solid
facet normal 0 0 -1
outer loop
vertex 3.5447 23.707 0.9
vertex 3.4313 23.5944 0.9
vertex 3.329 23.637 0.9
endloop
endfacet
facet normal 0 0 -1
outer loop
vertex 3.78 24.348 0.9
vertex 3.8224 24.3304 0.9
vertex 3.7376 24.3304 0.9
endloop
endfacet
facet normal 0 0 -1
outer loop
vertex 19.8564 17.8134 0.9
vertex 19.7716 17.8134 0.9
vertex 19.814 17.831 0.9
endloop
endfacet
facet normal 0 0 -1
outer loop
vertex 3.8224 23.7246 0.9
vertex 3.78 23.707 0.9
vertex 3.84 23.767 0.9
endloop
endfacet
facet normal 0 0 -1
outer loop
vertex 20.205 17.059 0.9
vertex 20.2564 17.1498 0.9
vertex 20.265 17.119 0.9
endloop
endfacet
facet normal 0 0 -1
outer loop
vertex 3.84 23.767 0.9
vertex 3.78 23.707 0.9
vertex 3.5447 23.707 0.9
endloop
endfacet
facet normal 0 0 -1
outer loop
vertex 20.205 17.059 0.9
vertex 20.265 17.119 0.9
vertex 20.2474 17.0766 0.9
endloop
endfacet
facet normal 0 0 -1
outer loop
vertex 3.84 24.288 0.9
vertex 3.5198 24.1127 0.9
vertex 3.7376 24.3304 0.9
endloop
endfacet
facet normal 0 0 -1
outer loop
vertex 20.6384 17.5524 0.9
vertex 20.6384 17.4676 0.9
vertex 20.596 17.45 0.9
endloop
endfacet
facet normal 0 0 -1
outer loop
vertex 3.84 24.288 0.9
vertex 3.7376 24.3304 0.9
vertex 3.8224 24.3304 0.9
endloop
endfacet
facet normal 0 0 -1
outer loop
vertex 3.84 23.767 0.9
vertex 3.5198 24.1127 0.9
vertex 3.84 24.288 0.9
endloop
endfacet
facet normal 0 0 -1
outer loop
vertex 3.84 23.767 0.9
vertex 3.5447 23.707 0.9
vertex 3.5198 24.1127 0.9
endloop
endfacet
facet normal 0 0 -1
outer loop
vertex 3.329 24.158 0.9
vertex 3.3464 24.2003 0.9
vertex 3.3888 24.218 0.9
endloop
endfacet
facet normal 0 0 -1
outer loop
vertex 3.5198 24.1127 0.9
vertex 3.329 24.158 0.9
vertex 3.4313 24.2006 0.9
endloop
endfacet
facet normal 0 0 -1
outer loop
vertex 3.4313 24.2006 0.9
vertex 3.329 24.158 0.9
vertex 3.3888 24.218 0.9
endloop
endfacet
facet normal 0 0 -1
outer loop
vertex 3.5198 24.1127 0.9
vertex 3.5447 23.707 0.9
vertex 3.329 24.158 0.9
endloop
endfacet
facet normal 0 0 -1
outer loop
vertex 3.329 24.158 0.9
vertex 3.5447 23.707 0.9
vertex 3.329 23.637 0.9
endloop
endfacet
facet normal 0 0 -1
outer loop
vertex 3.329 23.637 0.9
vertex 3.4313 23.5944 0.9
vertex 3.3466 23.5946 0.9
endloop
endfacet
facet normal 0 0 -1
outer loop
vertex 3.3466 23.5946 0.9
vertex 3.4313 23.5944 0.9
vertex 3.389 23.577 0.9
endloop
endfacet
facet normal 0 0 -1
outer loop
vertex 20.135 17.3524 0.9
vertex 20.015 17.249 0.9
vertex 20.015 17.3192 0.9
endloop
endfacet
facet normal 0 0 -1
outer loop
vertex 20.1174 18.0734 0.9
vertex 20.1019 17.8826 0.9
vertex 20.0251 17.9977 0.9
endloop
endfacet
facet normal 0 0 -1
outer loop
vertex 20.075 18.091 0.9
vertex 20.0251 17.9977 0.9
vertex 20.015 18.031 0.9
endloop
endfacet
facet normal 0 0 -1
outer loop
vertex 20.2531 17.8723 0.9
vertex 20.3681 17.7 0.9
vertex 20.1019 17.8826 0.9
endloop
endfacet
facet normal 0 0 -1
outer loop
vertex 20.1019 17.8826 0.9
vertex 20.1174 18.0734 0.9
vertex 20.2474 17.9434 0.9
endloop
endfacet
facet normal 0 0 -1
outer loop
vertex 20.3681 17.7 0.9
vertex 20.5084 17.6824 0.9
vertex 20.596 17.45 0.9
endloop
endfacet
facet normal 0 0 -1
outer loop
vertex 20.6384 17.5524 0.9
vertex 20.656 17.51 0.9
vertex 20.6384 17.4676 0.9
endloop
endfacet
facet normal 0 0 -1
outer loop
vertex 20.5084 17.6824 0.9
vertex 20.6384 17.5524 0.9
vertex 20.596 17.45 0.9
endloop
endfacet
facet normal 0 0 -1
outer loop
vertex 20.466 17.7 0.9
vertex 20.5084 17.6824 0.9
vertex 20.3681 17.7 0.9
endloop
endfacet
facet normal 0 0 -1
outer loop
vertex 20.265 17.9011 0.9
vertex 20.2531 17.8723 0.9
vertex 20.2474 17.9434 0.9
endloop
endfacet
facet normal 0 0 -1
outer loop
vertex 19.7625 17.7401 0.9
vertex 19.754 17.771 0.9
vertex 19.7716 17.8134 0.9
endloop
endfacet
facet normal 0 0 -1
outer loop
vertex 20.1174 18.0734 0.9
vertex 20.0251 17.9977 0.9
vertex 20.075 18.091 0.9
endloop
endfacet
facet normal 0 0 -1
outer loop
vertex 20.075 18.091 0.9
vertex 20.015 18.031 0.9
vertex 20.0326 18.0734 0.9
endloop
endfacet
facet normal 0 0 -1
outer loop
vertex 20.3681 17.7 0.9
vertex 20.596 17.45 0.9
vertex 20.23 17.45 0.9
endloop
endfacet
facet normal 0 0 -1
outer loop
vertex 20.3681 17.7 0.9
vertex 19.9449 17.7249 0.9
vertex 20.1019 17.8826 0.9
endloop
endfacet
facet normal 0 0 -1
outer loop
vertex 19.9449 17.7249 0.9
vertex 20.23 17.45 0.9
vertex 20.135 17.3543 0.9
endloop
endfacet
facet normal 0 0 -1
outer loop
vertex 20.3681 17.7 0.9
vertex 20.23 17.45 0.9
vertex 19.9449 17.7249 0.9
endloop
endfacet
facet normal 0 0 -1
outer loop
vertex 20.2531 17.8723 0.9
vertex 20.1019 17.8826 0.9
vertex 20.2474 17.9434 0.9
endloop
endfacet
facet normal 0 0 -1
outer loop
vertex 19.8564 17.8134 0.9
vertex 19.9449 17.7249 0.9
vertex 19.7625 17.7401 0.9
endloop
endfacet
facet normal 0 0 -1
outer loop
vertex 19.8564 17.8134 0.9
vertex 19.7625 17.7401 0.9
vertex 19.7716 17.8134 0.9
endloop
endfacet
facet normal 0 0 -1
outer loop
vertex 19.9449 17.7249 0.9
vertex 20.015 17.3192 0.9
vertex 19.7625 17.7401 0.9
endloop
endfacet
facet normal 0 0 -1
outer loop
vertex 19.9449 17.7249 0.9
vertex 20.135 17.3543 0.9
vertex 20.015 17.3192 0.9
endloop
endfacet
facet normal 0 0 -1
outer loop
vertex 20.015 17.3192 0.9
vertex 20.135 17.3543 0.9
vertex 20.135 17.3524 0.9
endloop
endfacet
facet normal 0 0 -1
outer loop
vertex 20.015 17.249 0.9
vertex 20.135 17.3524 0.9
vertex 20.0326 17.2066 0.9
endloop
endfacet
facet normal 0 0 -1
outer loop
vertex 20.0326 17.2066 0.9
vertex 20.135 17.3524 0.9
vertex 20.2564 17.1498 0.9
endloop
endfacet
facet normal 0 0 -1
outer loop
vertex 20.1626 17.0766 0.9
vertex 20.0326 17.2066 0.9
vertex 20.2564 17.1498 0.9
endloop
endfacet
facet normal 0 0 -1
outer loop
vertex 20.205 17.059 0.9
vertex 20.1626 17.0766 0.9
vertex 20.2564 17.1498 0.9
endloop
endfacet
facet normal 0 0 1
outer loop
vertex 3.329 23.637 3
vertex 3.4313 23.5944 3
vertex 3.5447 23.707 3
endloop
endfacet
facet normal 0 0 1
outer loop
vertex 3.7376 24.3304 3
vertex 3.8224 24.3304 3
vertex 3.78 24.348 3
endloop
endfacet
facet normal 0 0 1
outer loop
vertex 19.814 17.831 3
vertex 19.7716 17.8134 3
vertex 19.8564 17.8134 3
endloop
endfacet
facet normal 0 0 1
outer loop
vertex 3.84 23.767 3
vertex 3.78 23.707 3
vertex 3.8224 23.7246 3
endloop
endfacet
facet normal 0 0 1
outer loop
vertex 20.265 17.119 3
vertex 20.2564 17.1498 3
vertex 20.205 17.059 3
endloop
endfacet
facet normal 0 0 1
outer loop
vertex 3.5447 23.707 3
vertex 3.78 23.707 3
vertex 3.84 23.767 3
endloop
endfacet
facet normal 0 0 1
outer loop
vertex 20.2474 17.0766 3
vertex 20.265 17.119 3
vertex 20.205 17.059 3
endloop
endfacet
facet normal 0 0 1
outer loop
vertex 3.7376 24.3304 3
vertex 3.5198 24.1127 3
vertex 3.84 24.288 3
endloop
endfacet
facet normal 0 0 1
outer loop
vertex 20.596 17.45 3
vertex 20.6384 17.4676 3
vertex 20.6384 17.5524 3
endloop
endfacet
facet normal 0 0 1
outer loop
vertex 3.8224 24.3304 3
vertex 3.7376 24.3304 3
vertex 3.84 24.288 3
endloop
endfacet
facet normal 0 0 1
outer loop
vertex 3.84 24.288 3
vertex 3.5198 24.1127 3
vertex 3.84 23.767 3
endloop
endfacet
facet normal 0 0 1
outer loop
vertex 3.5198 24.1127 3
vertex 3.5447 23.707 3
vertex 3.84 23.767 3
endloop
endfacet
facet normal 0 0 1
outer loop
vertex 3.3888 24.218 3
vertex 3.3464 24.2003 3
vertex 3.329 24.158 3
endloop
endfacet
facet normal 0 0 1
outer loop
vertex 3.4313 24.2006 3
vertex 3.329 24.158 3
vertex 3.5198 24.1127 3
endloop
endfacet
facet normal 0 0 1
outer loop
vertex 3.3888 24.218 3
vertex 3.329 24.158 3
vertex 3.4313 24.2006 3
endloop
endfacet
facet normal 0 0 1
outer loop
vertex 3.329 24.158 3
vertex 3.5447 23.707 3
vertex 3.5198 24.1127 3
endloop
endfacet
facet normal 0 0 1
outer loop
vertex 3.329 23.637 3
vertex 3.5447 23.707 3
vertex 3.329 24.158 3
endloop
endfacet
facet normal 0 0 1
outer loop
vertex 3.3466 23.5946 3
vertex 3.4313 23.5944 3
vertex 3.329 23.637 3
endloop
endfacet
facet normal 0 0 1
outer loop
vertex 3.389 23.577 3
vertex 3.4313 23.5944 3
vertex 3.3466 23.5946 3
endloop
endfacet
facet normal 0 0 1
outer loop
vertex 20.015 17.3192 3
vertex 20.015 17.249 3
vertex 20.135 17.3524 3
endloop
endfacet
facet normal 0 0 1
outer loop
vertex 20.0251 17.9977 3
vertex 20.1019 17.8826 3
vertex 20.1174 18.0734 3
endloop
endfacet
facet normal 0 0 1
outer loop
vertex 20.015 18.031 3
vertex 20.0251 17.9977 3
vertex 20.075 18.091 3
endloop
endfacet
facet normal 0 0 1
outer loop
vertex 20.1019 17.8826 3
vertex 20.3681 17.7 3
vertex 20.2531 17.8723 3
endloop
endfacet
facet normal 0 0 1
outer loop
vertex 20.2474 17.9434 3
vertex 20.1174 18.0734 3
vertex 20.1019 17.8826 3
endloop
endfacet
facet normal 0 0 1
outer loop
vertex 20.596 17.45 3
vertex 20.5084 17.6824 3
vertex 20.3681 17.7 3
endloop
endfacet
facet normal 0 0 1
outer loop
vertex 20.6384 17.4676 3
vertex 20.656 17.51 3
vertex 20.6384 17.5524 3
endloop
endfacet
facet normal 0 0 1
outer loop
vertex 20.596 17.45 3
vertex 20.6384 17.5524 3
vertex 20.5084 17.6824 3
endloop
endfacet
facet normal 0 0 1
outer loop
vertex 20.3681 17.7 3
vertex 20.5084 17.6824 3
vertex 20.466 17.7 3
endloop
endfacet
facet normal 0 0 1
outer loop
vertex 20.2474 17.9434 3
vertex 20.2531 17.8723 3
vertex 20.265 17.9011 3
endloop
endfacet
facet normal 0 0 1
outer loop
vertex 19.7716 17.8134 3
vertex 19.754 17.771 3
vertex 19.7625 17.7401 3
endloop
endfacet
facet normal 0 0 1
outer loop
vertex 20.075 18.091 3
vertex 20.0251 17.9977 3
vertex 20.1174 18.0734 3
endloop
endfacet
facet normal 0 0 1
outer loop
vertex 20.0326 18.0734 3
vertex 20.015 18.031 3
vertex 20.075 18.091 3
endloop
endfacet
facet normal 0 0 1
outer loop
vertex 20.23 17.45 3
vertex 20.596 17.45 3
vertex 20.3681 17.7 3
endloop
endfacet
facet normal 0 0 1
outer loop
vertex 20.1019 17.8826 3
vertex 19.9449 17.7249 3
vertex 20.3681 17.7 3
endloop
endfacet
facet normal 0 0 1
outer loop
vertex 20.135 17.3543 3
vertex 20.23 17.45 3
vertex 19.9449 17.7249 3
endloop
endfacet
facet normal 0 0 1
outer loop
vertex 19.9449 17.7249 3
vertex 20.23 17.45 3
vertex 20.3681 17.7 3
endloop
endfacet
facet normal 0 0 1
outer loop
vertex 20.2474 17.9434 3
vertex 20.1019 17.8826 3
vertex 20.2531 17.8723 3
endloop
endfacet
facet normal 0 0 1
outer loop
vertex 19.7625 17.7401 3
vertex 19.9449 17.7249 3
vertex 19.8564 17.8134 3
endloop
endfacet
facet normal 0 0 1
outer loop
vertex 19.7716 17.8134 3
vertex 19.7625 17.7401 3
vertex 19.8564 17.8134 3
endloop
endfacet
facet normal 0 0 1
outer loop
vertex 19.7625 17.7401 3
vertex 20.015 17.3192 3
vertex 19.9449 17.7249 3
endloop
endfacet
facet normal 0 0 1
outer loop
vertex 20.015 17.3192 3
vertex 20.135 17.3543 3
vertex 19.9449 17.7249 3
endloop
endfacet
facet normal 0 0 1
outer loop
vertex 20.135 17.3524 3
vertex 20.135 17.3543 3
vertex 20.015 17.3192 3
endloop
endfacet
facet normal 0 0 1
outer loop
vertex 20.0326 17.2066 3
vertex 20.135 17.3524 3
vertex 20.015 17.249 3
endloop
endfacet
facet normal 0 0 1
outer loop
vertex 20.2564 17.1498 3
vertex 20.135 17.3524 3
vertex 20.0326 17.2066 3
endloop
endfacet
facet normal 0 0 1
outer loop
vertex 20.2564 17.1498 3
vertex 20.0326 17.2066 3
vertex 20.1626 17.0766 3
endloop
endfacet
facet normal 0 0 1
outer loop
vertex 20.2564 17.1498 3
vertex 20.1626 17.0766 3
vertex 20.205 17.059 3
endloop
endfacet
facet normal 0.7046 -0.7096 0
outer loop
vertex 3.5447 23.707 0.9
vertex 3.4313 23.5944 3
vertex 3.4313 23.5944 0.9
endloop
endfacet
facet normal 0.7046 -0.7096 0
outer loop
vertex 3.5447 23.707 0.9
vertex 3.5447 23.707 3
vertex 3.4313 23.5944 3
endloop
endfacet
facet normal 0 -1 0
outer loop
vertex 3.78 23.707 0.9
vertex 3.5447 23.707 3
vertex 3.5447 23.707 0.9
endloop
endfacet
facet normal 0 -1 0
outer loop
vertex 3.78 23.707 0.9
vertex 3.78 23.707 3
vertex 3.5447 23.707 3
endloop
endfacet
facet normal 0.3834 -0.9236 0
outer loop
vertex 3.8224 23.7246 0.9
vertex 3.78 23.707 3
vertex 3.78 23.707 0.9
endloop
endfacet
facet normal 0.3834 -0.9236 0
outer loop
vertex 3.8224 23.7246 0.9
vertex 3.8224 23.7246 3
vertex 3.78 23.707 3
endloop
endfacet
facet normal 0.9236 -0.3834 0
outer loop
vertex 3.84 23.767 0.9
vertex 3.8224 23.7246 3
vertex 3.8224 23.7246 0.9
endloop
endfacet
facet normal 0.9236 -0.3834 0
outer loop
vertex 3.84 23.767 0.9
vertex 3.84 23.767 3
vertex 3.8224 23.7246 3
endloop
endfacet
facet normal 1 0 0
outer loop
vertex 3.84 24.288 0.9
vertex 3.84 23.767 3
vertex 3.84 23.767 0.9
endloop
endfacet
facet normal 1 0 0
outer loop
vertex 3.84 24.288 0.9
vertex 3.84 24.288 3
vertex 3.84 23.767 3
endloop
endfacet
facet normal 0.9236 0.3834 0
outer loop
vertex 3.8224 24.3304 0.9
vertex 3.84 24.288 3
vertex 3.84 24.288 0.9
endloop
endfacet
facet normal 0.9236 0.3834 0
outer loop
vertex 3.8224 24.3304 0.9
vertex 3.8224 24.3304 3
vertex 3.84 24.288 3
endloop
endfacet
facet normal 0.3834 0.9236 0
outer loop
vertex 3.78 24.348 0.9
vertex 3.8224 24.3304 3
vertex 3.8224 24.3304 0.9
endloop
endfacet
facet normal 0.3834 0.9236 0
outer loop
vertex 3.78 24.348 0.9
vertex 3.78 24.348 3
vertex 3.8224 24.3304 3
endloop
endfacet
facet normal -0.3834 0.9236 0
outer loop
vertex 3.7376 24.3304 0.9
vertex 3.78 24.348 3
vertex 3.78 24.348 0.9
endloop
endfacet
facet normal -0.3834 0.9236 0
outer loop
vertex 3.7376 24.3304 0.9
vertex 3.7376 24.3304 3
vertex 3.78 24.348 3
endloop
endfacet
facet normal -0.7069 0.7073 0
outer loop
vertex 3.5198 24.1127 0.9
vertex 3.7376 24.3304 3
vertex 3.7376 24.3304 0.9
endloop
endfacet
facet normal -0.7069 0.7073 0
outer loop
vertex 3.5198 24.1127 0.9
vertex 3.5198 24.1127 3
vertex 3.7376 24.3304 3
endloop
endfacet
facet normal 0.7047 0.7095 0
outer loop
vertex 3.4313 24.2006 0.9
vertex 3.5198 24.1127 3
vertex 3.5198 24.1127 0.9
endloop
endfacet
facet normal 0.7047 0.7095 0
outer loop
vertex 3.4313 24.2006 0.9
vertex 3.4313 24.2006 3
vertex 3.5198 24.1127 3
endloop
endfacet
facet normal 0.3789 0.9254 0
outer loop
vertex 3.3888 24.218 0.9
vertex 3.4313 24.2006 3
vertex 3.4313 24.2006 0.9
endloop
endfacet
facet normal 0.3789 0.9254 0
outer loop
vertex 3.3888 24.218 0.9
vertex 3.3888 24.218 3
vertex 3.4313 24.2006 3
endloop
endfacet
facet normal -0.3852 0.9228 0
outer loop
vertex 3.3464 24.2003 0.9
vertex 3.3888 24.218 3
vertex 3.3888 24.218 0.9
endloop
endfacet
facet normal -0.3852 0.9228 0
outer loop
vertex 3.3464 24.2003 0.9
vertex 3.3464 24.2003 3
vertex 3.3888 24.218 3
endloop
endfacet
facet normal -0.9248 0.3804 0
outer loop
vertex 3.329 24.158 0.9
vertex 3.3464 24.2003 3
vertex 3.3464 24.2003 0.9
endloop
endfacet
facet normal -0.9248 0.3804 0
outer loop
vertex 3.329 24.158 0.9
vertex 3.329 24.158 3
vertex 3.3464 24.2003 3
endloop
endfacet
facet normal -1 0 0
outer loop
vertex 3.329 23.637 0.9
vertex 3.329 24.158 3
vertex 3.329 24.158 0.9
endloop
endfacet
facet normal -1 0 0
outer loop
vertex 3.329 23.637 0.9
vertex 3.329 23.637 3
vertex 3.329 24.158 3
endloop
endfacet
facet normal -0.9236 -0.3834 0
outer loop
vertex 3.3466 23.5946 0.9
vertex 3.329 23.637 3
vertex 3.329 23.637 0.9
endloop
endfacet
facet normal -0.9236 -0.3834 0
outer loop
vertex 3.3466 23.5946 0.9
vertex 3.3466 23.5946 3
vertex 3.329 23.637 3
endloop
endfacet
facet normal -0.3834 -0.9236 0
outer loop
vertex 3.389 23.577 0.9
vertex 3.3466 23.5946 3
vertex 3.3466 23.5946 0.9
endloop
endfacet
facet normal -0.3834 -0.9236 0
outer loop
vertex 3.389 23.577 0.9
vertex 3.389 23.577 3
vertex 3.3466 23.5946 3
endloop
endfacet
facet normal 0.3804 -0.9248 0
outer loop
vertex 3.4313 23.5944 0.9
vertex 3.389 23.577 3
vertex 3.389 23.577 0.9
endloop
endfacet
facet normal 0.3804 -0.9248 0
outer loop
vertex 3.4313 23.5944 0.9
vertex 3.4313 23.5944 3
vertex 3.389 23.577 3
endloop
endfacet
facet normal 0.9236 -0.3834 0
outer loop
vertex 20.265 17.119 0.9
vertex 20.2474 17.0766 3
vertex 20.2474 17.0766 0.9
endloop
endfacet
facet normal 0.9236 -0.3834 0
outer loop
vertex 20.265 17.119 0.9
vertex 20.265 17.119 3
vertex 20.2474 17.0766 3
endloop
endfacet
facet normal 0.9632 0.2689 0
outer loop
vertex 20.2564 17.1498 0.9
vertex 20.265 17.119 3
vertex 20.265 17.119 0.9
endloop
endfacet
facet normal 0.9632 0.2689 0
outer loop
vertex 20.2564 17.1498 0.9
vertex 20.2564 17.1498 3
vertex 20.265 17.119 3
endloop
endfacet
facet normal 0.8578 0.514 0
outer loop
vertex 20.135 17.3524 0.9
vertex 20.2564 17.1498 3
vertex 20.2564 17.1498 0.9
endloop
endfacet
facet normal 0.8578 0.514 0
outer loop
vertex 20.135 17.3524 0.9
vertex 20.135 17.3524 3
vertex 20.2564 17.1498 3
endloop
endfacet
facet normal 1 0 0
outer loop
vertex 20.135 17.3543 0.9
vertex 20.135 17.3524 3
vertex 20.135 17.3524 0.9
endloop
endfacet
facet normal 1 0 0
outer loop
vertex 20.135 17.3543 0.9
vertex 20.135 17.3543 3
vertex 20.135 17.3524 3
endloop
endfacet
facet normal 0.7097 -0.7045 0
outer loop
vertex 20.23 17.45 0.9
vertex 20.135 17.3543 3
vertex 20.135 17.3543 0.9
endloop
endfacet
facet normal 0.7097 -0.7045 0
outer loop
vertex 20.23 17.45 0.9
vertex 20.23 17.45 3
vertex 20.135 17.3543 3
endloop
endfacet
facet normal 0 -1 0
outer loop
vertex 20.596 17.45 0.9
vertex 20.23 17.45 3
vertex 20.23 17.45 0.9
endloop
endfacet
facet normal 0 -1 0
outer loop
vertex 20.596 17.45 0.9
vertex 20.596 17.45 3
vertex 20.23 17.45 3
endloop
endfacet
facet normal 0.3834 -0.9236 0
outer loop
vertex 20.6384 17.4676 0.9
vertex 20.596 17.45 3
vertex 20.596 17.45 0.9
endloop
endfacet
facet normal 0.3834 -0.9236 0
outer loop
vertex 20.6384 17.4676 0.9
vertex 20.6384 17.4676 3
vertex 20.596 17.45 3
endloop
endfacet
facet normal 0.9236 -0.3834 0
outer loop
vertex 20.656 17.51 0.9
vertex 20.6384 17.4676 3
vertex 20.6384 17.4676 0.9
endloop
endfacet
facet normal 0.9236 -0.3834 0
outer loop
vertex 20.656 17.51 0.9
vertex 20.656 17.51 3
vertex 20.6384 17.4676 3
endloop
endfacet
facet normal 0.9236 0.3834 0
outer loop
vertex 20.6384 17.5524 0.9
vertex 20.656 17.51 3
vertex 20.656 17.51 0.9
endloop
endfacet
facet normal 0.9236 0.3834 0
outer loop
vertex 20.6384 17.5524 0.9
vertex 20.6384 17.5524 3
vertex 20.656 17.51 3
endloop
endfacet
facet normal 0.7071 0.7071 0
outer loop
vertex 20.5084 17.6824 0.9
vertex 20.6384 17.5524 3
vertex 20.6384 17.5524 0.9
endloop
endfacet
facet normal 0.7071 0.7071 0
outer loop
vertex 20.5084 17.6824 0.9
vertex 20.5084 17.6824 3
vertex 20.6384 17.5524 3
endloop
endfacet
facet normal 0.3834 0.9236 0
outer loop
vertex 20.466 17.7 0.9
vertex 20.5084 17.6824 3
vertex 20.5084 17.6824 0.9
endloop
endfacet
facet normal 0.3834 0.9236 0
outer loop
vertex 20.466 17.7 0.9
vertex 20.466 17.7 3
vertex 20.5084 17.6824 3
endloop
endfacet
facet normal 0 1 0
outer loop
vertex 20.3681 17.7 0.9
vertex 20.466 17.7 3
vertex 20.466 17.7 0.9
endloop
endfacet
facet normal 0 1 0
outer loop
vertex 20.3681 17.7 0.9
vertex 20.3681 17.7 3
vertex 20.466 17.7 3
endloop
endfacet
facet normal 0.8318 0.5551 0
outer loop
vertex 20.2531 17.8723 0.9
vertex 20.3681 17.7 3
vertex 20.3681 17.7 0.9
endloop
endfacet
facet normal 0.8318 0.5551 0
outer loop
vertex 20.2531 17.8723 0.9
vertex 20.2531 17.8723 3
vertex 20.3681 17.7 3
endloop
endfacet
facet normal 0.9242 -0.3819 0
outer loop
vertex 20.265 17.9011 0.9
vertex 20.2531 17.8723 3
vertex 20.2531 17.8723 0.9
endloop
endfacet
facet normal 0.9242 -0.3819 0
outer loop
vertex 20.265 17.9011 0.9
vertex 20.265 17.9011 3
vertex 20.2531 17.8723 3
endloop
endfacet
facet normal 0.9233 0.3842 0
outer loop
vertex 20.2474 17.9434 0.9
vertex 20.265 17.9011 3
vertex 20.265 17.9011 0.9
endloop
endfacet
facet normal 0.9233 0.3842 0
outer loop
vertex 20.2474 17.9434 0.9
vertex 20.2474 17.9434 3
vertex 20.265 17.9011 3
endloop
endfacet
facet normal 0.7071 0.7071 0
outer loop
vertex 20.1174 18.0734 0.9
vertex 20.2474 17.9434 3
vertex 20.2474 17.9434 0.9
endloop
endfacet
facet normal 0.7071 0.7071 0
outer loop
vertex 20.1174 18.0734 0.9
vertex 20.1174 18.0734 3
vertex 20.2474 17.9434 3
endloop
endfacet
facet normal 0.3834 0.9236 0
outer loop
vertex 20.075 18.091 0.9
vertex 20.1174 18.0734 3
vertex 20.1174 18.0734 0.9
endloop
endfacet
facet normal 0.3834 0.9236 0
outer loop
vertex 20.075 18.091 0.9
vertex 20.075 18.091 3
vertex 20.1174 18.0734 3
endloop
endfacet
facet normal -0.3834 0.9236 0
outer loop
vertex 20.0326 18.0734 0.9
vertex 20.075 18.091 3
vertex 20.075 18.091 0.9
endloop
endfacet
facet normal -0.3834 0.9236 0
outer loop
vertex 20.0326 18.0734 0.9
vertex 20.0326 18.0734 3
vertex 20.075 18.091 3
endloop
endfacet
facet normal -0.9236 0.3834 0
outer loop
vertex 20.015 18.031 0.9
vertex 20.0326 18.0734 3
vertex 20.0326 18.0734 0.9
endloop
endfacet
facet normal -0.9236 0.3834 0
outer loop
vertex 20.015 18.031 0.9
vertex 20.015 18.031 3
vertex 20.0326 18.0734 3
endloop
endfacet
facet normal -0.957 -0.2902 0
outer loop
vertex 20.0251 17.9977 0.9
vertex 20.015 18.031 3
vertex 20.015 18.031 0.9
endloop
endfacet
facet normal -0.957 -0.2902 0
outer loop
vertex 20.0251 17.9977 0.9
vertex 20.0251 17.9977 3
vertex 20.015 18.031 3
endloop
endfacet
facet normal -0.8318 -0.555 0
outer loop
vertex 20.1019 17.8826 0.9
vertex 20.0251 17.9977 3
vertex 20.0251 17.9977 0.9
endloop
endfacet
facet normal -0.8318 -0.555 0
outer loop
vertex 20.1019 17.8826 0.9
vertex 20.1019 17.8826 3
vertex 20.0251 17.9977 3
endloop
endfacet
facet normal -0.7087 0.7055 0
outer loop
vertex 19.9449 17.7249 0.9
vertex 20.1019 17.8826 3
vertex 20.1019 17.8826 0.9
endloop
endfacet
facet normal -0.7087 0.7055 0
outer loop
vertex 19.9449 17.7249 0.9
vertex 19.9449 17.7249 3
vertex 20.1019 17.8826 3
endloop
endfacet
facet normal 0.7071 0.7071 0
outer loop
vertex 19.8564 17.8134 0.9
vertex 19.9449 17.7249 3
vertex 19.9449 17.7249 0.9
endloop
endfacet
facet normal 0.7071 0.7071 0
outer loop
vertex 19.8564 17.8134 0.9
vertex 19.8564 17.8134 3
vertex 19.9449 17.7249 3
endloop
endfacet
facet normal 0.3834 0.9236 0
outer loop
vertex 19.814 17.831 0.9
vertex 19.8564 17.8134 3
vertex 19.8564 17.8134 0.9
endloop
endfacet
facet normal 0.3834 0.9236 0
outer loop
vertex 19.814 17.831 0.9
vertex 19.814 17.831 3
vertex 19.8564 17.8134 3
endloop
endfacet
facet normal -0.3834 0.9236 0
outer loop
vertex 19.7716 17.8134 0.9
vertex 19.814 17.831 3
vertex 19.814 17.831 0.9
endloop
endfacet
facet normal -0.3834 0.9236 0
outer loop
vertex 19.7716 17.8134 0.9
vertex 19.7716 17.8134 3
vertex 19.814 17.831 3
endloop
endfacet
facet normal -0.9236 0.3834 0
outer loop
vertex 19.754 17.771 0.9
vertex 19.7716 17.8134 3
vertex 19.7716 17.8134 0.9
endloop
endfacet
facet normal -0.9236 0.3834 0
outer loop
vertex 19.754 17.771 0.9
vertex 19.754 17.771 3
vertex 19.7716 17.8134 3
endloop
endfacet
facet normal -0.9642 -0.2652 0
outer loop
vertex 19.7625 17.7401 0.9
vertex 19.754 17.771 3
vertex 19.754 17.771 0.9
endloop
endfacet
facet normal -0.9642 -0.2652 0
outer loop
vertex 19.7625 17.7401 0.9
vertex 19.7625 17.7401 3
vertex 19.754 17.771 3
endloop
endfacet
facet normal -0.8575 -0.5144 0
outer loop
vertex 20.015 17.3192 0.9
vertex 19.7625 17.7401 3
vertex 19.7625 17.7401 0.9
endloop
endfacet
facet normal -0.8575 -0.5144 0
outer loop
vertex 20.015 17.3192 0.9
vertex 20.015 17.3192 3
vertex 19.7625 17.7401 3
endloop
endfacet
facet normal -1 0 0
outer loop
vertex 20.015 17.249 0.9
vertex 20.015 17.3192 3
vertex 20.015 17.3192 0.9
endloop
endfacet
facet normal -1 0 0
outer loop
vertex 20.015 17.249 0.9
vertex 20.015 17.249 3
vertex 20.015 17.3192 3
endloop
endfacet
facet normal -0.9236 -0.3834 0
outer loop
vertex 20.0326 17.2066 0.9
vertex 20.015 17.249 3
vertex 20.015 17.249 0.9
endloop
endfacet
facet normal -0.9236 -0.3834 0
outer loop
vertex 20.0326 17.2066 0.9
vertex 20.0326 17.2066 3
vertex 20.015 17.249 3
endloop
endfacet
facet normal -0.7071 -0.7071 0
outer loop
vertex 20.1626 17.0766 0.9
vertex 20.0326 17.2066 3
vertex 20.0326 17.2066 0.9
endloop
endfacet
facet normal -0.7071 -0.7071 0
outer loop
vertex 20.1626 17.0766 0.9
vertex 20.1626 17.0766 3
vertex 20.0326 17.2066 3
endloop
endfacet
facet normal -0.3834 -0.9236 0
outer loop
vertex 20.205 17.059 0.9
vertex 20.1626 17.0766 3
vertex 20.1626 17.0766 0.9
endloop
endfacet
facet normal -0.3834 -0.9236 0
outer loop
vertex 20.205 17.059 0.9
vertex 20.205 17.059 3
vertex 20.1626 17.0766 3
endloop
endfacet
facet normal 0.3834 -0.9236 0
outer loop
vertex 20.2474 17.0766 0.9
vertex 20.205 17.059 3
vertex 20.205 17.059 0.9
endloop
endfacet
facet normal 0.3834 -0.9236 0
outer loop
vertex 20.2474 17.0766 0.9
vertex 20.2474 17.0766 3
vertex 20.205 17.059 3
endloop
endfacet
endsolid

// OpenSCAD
$fn = 24;
translate([0, -2.500, 0.900])
  linear_extrude(height=2.100) {
offset(r=0.06, $fn=8) {
    polygon(points=[[20.075,20.531],[20.205,20.401],[19.945,20.140],[19.814,20.271],[19.814,20.401],[19.814,20.271],[20.205,19.619],[20.075,19.749],[20.075,19.879],[20.205,20.010],[20.596,20.010],[20.727,19.879],[20.466,20.140],[20.336,20.140]], paths=[[0,1,2,3,4,5,6,7,8,9,10,11,12,13]]);
    polygon(points=[[3.780,26.788],[3.520,26.528],[3.389,26.658],[3.389,26.788],[3.389,26.137],[3.520,26.267],[3.780,26.267]], paths=[[0,1,2,3,4,5,6]]);
}
}
